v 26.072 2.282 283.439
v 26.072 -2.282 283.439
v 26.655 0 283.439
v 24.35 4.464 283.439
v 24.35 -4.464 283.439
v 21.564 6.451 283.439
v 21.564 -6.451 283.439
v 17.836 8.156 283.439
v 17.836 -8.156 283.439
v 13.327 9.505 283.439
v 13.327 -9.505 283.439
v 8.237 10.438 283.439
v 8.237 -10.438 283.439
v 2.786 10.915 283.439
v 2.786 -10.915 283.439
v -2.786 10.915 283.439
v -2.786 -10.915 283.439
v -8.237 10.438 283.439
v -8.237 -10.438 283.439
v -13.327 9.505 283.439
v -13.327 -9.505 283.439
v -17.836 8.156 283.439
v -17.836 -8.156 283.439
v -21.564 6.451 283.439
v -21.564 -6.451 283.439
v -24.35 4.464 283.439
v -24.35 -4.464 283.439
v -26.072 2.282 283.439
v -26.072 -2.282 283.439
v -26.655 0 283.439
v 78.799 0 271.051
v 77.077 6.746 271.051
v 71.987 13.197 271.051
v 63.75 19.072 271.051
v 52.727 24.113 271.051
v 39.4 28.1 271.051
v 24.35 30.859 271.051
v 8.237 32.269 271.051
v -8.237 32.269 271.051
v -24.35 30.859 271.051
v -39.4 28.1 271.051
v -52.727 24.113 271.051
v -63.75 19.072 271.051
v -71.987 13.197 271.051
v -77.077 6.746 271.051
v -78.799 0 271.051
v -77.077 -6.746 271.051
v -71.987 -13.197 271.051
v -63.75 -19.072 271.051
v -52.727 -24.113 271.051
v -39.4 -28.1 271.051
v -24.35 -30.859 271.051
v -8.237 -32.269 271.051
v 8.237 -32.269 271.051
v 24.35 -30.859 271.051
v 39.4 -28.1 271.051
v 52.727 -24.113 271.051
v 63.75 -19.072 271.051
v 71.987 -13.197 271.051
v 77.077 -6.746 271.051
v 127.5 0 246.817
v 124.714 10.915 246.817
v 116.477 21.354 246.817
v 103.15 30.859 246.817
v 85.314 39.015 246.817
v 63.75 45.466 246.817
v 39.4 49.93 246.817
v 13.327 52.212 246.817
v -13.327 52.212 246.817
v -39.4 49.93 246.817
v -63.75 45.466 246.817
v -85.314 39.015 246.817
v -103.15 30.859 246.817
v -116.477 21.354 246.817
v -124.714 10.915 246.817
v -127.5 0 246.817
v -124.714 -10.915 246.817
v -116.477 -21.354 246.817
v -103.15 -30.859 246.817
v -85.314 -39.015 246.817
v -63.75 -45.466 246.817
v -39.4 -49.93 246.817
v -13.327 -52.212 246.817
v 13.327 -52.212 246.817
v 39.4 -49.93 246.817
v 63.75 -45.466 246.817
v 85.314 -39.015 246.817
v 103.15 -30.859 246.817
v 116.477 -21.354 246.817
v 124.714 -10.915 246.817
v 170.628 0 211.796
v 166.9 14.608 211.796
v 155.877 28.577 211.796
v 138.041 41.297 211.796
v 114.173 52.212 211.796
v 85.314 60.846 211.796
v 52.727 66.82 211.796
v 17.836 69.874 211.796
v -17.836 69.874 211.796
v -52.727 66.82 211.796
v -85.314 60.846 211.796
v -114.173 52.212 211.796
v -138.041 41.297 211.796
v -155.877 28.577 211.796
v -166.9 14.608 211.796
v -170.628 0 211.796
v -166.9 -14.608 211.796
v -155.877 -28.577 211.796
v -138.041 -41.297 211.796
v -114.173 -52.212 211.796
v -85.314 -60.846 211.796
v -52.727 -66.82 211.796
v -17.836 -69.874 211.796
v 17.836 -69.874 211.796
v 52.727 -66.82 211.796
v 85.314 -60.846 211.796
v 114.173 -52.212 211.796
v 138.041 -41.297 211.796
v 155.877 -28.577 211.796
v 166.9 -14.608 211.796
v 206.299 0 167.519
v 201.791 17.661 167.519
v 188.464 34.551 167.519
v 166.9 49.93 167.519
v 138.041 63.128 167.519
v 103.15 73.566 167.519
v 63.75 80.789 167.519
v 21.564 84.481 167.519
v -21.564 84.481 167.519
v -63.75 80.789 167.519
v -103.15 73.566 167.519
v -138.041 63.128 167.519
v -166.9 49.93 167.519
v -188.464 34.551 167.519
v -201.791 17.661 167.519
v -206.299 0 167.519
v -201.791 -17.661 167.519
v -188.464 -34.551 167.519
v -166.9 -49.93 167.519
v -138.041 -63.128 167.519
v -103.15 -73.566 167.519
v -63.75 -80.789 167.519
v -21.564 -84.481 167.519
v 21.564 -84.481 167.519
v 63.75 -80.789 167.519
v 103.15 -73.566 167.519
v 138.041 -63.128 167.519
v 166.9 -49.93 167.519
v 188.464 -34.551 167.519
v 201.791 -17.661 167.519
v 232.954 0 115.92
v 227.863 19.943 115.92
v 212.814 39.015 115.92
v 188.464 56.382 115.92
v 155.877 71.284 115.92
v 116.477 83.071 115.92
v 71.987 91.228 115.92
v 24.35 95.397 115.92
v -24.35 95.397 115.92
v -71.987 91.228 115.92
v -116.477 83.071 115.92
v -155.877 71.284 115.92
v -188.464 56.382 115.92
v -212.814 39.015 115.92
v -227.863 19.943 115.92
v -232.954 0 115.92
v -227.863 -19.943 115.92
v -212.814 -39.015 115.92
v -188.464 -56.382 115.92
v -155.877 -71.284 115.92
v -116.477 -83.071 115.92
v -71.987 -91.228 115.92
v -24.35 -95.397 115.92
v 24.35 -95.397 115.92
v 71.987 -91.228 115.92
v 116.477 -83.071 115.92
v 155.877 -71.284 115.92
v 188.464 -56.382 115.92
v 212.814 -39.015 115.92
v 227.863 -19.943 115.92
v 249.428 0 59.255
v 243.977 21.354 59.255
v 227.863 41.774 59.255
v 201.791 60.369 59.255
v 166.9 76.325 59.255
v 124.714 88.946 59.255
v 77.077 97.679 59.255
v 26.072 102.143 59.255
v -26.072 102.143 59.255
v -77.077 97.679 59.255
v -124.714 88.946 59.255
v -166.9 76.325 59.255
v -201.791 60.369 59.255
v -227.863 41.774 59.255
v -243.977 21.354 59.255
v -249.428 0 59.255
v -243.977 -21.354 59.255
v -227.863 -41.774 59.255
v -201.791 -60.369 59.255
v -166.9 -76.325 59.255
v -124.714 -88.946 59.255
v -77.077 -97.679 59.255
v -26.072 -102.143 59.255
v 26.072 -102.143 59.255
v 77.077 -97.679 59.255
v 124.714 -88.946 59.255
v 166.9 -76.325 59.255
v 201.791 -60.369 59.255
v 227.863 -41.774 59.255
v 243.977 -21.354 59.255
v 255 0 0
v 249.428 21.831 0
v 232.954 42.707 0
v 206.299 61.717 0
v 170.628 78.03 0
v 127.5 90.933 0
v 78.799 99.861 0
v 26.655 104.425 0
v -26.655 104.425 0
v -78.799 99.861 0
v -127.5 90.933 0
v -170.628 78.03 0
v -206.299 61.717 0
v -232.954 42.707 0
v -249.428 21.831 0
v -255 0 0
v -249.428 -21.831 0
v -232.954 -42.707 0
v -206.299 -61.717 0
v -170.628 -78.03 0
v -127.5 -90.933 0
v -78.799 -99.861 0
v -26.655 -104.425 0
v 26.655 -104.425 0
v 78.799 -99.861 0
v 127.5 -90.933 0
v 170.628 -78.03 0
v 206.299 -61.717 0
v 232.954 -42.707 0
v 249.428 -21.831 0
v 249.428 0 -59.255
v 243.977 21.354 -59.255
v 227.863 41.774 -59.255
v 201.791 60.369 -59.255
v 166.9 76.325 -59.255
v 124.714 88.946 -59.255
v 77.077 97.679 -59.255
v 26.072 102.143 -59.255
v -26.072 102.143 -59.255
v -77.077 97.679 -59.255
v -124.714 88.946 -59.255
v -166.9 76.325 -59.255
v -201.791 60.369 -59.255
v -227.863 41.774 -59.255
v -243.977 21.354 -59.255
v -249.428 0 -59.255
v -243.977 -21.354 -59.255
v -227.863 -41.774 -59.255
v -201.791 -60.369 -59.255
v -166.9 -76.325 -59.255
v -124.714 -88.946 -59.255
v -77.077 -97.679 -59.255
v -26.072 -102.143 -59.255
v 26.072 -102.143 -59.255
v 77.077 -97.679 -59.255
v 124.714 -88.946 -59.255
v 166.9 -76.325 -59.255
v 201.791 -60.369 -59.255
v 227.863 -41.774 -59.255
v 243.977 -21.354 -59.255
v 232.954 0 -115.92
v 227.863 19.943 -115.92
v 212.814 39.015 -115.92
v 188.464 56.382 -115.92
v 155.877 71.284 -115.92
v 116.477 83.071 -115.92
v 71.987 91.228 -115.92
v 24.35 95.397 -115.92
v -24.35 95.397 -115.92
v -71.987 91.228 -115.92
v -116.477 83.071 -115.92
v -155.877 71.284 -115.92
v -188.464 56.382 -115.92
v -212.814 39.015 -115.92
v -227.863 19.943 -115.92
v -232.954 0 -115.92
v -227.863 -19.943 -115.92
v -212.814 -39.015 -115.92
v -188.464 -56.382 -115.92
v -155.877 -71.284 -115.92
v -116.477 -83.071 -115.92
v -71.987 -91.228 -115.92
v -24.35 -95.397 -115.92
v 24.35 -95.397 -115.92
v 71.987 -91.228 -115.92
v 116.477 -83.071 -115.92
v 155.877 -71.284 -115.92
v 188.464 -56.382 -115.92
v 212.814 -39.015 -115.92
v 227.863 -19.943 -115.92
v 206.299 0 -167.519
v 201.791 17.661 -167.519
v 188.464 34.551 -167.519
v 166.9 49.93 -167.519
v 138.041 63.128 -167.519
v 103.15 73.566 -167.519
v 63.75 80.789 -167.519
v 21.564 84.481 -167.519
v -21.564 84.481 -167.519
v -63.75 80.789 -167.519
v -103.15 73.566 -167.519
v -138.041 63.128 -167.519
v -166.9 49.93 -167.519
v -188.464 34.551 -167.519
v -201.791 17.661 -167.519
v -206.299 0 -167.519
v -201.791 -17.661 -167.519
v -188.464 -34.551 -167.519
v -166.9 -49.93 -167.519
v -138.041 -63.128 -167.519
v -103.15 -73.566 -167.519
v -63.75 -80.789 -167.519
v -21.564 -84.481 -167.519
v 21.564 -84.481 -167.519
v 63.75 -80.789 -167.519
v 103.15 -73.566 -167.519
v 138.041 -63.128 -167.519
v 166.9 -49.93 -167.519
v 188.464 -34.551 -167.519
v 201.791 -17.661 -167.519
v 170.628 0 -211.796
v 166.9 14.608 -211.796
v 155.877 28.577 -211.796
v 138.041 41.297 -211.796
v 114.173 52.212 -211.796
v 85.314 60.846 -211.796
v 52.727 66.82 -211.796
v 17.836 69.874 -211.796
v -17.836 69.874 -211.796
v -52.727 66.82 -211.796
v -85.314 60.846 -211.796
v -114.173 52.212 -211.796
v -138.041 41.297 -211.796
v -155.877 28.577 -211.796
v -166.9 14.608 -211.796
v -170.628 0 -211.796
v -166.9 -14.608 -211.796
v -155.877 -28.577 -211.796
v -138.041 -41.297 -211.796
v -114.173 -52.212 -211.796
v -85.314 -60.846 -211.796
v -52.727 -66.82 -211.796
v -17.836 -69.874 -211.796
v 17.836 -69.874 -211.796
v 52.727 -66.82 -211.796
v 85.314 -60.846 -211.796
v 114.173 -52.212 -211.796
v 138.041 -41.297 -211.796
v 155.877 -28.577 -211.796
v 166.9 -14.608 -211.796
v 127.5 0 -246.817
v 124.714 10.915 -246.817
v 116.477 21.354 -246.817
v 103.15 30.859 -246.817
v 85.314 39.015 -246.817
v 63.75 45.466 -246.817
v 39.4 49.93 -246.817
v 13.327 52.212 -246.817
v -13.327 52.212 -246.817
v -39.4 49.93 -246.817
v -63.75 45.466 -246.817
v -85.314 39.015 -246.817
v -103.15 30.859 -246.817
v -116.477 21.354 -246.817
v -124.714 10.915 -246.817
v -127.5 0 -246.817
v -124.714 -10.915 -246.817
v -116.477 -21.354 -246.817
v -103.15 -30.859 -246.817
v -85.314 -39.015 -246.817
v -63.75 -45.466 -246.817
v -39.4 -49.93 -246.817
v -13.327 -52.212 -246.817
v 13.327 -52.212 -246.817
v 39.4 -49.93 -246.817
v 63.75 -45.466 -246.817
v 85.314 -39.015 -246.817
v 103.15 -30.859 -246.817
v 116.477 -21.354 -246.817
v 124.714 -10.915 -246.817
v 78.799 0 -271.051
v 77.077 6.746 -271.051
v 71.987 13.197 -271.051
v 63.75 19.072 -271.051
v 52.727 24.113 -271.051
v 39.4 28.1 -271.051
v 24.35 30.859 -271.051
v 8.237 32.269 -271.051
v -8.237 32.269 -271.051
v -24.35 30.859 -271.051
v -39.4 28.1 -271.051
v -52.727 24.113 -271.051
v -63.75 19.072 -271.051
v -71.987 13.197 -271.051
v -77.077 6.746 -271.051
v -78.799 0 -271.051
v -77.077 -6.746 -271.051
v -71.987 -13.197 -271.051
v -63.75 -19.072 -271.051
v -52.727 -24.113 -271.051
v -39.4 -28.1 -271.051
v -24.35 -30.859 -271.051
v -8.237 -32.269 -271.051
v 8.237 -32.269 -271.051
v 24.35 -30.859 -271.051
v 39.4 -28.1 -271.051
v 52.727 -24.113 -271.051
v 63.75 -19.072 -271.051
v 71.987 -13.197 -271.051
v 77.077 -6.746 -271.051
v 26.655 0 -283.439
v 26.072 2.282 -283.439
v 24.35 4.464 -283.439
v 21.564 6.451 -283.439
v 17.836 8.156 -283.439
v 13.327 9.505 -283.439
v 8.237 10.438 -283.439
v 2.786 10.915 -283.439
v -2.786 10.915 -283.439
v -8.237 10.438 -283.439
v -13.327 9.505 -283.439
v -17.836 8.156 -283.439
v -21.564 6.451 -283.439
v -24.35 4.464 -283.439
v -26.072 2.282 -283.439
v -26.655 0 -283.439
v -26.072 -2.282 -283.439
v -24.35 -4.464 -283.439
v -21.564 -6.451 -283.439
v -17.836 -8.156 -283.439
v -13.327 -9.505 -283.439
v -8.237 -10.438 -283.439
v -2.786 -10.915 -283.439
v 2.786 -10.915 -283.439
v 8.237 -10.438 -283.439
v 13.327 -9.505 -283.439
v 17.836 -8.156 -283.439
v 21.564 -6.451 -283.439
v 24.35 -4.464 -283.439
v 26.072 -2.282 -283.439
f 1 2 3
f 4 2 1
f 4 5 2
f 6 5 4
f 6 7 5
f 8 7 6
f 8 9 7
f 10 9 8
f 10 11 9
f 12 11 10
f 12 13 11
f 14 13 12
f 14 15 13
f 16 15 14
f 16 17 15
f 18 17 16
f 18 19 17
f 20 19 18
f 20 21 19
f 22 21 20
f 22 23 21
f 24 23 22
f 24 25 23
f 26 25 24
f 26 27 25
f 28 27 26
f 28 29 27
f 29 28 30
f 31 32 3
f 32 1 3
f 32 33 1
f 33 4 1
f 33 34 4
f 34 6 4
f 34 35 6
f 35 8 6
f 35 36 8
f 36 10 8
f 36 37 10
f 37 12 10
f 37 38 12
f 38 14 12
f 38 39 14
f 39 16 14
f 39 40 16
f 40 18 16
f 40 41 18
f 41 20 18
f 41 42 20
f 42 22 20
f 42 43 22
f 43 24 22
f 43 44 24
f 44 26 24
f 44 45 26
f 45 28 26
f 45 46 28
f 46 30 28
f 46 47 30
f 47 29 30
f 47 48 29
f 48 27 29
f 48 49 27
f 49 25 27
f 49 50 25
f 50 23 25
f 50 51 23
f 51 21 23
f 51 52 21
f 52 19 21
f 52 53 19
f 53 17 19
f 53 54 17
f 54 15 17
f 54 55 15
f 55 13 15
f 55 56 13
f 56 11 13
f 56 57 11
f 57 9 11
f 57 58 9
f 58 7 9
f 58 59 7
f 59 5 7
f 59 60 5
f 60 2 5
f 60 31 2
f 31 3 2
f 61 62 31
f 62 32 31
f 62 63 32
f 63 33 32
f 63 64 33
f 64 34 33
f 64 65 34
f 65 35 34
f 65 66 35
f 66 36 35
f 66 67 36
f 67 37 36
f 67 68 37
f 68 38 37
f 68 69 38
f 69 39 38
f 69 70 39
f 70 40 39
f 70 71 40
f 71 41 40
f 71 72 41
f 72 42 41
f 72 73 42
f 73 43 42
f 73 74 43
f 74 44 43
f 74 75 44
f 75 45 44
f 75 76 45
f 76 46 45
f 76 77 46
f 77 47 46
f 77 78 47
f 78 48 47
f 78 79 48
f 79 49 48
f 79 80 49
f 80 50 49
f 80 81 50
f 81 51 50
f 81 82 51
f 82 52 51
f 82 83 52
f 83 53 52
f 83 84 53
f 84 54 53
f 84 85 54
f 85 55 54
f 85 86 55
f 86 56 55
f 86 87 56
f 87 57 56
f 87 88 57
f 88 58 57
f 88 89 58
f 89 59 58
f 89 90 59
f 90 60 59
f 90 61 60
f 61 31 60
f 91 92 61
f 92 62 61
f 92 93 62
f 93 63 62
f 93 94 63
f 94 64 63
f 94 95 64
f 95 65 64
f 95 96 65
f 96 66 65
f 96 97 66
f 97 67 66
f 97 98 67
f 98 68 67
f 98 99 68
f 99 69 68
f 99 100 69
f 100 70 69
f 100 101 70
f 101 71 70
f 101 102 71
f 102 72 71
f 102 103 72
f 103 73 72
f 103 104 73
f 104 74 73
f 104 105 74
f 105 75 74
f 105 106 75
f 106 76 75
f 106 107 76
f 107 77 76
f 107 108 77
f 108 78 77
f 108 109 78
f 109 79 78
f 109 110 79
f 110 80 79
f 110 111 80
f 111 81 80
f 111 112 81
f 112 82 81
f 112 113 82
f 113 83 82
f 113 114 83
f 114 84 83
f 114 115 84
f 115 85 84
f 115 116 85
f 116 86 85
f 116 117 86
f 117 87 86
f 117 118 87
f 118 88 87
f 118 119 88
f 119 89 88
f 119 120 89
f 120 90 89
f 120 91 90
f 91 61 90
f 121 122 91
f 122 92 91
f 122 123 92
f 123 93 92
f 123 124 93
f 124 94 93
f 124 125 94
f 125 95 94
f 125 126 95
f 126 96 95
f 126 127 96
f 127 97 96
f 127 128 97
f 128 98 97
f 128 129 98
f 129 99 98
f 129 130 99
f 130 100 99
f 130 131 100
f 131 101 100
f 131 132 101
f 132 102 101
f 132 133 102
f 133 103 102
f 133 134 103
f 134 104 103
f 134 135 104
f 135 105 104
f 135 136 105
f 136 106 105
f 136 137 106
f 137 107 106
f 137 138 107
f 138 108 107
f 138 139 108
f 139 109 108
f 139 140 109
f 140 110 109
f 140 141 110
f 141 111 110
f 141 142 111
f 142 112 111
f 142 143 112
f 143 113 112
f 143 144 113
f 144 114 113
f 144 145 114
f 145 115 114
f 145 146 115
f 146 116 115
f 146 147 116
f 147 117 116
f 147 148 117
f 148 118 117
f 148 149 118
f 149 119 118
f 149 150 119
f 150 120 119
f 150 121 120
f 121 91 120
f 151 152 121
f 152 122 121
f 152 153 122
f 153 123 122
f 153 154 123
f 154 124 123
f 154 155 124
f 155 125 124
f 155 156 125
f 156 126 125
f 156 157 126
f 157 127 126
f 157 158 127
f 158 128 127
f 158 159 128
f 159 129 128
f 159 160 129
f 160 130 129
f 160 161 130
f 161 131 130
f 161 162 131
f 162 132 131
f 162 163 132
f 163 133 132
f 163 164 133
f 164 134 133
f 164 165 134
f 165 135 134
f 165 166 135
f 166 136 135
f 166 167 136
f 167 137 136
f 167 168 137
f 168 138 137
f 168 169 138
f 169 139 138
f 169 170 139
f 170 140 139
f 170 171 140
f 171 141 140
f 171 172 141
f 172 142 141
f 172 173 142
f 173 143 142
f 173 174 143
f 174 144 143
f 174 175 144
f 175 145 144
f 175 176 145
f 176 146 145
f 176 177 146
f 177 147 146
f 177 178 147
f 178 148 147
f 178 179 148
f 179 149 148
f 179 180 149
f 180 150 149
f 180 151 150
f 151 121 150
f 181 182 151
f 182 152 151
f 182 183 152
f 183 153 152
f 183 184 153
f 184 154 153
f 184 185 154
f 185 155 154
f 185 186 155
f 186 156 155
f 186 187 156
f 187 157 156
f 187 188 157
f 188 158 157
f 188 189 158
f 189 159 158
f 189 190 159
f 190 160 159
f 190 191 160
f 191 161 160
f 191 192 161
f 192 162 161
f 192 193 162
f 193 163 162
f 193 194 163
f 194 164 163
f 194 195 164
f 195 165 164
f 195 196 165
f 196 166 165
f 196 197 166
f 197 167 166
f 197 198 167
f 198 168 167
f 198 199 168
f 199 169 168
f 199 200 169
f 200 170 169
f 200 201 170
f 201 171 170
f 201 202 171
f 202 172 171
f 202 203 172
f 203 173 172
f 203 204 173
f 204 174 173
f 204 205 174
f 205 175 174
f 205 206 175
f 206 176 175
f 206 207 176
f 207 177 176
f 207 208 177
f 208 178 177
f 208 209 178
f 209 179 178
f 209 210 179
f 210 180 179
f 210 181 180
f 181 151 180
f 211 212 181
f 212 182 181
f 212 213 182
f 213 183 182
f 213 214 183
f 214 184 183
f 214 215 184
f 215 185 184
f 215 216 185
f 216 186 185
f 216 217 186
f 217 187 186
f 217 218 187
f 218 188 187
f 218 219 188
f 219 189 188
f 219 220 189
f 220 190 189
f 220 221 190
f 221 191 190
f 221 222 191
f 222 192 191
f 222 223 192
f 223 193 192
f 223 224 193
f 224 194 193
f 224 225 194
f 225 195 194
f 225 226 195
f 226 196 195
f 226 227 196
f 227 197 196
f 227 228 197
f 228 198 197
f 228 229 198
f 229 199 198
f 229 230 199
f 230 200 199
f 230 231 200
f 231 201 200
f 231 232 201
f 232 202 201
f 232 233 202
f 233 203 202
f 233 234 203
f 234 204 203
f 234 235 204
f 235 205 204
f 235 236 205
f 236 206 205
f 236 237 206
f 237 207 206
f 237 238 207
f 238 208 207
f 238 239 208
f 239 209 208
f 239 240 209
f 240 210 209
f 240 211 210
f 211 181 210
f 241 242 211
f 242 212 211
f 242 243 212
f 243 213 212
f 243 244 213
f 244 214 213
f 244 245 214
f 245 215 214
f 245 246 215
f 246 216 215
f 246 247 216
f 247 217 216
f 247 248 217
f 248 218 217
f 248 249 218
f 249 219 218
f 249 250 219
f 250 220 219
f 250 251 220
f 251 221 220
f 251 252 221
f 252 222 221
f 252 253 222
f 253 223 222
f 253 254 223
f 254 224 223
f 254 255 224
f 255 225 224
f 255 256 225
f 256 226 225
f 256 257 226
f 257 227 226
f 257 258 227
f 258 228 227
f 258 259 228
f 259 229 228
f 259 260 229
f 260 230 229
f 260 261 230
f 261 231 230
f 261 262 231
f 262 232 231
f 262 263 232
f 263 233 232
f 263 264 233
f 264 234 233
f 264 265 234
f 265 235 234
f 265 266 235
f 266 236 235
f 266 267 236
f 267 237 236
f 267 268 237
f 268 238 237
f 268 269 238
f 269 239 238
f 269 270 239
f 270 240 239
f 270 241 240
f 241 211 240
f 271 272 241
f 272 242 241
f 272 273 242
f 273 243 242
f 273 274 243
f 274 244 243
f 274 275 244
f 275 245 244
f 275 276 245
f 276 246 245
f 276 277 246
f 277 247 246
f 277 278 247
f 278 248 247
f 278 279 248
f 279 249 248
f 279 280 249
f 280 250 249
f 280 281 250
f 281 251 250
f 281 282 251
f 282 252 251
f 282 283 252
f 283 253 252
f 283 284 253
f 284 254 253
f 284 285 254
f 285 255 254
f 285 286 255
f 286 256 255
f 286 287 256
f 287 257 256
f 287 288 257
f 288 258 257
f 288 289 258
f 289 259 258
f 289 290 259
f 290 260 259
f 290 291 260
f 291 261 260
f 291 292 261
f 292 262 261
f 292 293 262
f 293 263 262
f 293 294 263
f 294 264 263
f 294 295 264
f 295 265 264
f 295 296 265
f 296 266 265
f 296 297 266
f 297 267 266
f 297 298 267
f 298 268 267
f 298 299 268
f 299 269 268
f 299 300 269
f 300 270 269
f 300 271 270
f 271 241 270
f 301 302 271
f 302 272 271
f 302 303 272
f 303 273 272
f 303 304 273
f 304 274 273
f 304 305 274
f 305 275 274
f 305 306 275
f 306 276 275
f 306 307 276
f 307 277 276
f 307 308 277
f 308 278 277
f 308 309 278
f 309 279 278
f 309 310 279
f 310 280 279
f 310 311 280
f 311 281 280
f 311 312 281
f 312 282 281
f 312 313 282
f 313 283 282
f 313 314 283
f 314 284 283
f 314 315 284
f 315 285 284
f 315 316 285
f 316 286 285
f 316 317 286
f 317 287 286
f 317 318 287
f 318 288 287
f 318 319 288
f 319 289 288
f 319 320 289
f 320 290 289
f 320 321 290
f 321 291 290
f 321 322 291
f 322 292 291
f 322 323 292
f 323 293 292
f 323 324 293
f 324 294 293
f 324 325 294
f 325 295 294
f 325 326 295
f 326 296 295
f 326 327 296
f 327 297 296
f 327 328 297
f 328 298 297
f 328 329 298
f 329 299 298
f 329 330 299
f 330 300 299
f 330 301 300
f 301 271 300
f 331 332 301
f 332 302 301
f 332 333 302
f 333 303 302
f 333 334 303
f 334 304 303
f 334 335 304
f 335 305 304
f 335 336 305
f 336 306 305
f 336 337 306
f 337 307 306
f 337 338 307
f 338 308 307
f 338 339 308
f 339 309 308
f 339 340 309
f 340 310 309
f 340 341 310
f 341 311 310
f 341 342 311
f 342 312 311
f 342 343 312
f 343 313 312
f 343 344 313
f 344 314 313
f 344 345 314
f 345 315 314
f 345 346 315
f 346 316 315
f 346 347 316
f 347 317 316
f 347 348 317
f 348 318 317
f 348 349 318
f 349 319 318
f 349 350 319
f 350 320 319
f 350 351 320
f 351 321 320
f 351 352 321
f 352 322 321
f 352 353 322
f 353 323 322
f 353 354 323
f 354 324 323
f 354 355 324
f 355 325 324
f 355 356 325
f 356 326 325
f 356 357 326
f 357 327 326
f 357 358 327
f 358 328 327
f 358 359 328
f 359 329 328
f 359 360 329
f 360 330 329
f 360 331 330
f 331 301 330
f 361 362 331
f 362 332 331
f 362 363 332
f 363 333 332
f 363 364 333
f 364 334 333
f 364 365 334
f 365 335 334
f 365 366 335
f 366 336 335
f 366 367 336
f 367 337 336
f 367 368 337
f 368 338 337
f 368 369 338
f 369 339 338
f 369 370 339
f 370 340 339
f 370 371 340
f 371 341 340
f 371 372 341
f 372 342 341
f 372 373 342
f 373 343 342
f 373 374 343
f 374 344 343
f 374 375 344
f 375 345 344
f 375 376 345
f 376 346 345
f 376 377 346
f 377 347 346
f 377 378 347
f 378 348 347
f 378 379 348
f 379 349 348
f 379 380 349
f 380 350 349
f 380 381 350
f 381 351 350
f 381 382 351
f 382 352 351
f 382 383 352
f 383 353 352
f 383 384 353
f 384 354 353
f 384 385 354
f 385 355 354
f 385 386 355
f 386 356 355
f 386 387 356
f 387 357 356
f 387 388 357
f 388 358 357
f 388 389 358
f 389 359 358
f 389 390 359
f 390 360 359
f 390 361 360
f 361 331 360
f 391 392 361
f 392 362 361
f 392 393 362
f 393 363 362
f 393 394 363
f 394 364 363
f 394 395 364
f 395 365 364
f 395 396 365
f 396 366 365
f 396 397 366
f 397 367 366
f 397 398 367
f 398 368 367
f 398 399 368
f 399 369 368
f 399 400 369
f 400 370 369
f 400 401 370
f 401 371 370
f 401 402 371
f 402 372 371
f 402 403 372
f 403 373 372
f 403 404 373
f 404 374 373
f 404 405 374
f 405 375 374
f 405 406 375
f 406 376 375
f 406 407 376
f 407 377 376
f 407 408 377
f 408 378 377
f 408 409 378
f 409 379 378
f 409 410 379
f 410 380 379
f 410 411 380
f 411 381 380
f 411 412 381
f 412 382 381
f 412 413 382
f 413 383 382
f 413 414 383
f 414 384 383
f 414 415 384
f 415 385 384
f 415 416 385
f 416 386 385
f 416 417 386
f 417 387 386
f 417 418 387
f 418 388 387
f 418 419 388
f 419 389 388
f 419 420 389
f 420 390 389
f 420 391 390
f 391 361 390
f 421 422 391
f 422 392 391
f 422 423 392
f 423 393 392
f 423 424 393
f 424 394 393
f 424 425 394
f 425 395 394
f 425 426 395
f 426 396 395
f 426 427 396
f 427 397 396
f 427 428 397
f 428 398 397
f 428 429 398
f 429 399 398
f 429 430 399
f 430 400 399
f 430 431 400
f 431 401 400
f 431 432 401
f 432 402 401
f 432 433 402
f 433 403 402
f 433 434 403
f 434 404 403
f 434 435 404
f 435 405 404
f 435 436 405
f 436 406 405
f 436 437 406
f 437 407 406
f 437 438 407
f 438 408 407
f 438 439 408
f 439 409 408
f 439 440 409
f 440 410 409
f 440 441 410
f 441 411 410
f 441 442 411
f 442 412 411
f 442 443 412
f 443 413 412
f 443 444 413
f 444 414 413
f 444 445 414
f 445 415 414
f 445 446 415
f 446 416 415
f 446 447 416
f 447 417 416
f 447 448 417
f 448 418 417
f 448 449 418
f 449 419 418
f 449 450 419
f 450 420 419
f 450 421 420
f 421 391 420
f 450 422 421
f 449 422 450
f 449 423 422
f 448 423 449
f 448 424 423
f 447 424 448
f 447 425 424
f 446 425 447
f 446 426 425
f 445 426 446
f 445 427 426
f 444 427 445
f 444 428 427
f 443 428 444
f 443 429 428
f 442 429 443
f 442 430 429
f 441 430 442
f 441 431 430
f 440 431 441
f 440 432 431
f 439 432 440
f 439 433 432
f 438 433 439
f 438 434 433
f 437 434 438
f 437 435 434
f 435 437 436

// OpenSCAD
// Generated by SolidPython 1.0.1 on 2020-07-29 00:46:52


scale(v = [17, 7, 19]) {
	sphere(r = 15);
}
/***********************************************
*********      SolidPython code:      **********
************************************************
 
# import packages: SolidPython
from solid import *
from solid.utils import *
from itertools import chain, combinations, permutations


class Resize:

    def __init__(self, scad_file):
        self.scad_file = scad_file
        #self.scad_file = import_scad(scad_file)
        # cone/cylinder param:
        self.r1 = 0
        self.r2 = 0
        self.h = 0
        # rectangular prism param:
        self.w = 0
        self.l = 0
        # ellipse param:
        self.r = 0

    # import OpenScad code (file name corresponds to shape)


    # classify shape + parameters
    def assign(self, param1, param2, param3):
        if self.scad_file == 'cone.scad':
            self.r1 = param1
            self.r2 = param2
            self.h = param3
        elif self.scad_file == 'cylinder.scad':
            self.r1 = param1
            self.r2 = param2
            self.h = param3
        elif self.scad_file == 'rectangularPrism.scad':
            self.h = param1
            self.l = param2
            self.w = param3
        else:
            self.r = param1
            self.h = param2

    # resize parameters
    def iterate(self):
        x = range(3, 20, 2)
        i = 1
        if self.scad_file == 'cone.scad':
            tempList = list(permutations(x, 2))
            for temp in tempList:
                param1 = temp[0]
                param2 = temp[1]
                filepath = 'produced_scad_files/' + 'cone' + str(param1) + '_' + str(param2) + '_' + '.scad'
                scad_render_to_file(cylinder(h=param1, r1=param2, r2=0), filepath)

        elif self.scad_file == 'cylinder.scad':
            tempList = list(permutations(x, 3))
            for temp in tempList:
                param1 = temp[0]
                param2 = temp[1]
                filepath = 'produced_scad_files/' + 'cylinder' + str(param1) + '_' + str(param2) + '_' + '.scad'
                scad_render_to_file(cylinder(h=param1, r1=param2, r2=param2), filepath)

        elif self.scad_file == 'rectangularPrism.scad':
            tempList = list(permutations(x, 3))
            for temp in tempList:
                param1 = temp[0]
                param2 = temp[1]
                param3 = temp[2]
                filepath = 'produced_scad_files/' + 'rectangularPrism' + str(param1) + '_' + str(param2) + '_' + str(
                    param3) + '.scad'
                scad_render_to_file(cube(size=(param1, param2, param3)), filepath)

        elif self.scad_file == 'ellipse.scad':
            tempList = list(permutations(x, 4))
            for temp in tempList:
                param1 = temp[0]
                param2 = temp[1]
                param3 = temp[2]
                param4 = temp[3]
                filepath = 'produced_scad_files/' + 'ellipse' + str(param1) + '_' + str(param2) + '_' + str(param3) + '_' + str(param4) + '.scad'
                scad_render_to_file(scale([param1, param2, param3])(sphere(r=param4)), filepath)

    def render_to_scadfile(self):
        scad_render_to_file(scad, 'example.scad') 
 
************************************************/
